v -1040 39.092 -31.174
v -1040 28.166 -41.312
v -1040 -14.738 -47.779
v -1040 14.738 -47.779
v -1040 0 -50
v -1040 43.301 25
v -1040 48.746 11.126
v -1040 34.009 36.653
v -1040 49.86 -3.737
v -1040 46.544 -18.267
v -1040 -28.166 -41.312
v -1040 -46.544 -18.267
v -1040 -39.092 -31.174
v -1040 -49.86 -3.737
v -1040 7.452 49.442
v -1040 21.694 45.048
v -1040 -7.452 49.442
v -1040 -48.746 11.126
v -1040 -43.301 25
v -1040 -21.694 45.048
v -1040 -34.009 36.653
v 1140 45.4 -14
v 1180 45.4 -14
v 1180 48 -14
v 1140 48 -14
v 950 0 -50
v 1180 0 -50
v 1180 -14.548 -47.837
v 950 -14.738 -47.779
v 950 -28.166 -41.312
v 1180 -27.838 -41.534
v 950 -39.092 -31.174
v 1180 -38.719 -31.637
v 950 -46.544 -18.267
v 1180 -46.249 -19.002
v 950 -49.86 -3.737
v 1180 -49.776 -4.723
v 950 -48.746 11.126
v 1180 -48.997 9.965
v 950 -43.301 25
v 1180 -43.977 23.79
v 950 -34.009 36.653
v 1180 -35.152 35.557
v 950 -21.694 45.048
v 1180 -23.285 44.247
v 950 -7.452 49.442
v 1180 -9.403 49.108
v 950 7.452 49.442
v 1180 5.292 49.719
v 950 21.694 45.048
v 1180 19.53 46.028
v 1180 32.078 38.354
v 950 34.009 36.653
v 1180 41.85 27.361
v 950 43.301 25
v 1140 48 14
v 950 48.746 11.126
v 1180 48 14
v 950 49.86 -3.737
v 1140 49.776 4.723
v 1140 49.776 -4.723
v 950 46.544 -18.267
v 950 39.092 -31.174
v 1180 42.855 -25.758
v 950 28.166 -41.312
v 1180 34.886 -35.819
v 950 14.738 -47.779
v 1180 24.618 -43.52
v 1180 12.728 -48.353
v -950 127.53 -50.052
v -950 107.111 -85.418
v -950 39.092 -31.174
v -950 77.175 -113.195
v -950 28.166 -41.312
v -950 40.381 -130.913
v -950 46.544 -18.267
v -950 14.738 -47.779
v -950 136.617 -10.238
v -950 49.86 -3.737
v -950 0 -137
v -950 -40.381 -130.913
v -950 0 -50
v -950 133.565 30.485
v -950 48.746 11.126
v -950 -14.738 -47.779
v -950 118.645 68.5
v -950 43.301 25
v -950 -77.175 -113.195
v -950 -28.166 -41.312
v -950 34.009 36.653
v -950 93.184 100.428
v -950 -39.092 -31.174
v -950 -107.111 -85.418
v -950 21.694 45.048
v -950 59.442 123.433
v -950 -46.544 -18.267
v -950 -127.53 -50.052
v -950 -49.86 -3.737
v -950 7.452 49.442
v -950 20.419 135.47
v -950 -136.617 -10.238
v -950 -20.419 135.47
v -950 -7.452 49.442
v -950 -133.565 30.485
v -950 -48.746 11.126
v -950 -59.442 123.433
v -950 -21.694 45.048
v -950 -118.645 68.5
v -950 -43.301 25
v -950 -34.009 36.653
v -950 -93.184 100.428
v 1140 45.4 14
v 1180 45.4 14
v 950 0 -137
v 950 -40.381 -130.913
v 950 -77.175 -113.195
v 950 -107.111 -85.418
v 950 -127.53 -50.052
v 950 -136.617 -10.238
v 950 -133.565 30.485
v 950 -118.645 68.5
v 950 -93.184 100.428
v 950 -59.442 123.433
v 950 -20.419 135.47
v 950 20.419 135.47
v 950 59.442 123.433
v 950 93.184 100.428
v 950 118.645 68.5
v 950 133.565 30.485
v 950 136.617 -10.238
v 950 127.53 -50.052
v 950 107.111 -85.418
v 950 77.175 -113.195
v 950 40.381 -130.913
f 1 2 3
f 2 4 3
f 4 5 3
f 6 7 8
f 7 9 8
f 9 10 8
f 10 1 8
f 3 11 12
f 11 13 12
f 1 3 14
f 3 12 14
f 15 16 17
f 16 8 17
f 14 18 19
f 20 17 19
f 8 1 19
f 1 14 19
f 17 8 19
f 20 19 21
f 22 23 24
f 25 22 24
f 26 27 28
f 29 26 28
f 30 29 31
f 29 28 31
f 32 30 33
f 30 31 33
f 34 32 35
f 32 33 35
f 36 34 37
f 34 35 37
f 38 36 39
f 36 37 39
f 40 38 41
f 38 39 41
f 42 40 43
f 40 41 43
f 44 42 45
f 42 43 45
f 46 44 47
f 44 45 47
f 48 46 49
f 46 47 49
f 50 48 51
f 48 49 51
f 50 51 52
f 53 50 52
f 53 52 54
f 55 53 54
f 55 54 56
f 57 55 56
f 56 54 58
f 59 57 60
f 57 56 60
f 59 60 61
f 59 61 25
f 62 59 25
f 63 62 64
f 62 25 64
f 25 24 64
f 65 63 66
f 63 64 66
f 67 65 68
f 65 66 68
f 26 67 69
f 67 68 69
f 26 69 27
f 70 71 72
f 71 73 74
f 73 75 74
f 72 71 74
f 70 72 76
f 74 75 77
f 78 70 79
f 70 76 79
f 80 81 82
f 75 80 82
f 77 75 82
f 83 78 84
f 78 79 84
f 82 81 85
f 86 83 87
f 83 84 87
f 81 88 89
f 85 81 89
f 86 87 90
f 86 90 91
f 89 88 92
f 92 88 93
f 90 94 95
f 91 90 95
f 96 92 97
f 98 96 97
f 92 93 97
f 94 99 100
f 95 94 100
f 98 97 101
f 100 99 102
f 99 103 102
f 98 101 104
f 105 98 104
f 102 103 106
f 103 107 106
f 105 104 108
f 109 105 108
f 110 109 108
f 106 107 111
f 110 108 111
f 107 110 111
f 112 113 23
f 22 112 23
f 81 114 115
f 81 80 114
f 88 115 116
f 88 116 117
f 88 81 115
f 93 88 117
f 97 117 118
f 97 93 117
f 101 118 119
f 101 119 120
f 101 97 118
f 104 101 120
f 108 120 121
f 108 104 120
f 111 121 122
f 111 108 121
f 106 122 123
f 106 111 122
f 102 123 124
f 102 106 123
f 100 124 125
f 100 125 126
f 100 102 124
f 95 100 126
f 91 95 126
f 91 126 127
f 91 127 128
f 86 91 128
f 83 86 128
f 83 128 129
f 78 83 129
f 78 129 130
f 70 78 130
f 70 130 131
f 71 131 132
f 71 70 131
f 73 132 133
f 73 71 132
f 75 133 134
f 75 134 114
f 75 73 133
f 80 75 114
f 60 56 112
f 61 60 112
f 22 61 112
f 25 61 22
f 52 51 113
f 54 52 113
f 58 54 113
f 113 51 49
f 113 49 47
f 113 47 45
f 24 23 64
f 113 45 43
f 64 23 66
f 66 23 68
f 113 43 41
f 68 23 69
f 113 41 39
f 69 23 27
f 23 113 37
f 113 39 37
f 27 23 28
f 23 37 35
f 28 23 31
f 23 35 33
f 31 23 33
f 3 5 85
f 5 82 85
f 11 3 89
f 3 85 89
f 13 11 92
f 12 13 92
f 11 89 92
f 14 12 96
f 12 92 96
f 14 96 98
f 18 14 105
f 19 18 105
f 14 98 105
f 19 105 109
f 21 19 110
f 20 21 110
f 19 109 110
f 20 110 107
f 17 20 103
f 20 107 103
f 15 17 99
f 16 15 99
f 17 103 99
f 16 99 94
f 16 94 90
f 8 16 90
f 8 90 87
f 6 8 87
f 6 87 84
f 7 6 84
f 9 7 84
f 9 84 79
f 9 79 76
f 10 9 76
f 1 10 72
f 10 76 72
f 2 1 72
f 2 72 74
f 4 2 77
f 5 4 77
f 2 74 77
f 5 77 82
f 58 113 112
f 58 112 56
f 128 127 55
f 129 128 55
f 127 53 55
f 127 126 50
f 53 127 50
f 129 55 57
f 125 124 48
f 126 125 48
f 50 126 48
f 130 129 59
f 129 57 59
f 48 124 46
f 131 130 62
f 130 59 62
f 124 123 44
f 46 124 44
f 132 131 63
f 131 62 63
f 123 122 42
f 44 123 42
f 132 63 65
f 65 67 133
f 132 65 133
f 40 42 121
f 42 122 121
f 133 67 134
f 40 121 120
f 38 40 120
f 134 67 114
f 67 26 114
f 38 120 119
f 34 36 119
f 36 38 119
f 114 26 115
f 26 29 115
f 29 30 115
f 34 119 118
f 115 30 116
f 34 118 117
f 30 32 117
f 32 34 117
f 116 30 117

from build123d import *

# Parameters (mm, degrees)
SKETCH2_W          = 28
SKETCH2_H          = 5.2
CUT_EXTRUDE1_DEPTH = 40


with BuildPart() as part:
    # Sketch1 → Revolve1 (revolve)
    with BuildSketch(Plane(origin=(0, 0, 0), x_dir=(1, 0, 0), z_dir=(0, 1, 0))):
        Polygon((0, 0), (-1040, 0), (-1040, 50), (-950, 50), (-950, 137), (0, 137), (950, 137), (950, 50), (1180, 50), (1180, 0), align=None)
    revolve(axis=Axis((0, 0, 0), (-1, 0, 0)))

    # Sketch2 → Cut-Extrude1 (cut)
    with BuildSketch(Plane(origin=(1180, 0, 0), x_dir=(0, 0, -1), z_dir=(1, 0, 0))):
        with Locations((0, 48)):
            Rectangle(SKETCH2_W, SKETCH2_H)
    extrude(amount=-CUT_EXTRUDE1_DEPTH, mode=Mode.SUBTRACT)


solid = part.part
